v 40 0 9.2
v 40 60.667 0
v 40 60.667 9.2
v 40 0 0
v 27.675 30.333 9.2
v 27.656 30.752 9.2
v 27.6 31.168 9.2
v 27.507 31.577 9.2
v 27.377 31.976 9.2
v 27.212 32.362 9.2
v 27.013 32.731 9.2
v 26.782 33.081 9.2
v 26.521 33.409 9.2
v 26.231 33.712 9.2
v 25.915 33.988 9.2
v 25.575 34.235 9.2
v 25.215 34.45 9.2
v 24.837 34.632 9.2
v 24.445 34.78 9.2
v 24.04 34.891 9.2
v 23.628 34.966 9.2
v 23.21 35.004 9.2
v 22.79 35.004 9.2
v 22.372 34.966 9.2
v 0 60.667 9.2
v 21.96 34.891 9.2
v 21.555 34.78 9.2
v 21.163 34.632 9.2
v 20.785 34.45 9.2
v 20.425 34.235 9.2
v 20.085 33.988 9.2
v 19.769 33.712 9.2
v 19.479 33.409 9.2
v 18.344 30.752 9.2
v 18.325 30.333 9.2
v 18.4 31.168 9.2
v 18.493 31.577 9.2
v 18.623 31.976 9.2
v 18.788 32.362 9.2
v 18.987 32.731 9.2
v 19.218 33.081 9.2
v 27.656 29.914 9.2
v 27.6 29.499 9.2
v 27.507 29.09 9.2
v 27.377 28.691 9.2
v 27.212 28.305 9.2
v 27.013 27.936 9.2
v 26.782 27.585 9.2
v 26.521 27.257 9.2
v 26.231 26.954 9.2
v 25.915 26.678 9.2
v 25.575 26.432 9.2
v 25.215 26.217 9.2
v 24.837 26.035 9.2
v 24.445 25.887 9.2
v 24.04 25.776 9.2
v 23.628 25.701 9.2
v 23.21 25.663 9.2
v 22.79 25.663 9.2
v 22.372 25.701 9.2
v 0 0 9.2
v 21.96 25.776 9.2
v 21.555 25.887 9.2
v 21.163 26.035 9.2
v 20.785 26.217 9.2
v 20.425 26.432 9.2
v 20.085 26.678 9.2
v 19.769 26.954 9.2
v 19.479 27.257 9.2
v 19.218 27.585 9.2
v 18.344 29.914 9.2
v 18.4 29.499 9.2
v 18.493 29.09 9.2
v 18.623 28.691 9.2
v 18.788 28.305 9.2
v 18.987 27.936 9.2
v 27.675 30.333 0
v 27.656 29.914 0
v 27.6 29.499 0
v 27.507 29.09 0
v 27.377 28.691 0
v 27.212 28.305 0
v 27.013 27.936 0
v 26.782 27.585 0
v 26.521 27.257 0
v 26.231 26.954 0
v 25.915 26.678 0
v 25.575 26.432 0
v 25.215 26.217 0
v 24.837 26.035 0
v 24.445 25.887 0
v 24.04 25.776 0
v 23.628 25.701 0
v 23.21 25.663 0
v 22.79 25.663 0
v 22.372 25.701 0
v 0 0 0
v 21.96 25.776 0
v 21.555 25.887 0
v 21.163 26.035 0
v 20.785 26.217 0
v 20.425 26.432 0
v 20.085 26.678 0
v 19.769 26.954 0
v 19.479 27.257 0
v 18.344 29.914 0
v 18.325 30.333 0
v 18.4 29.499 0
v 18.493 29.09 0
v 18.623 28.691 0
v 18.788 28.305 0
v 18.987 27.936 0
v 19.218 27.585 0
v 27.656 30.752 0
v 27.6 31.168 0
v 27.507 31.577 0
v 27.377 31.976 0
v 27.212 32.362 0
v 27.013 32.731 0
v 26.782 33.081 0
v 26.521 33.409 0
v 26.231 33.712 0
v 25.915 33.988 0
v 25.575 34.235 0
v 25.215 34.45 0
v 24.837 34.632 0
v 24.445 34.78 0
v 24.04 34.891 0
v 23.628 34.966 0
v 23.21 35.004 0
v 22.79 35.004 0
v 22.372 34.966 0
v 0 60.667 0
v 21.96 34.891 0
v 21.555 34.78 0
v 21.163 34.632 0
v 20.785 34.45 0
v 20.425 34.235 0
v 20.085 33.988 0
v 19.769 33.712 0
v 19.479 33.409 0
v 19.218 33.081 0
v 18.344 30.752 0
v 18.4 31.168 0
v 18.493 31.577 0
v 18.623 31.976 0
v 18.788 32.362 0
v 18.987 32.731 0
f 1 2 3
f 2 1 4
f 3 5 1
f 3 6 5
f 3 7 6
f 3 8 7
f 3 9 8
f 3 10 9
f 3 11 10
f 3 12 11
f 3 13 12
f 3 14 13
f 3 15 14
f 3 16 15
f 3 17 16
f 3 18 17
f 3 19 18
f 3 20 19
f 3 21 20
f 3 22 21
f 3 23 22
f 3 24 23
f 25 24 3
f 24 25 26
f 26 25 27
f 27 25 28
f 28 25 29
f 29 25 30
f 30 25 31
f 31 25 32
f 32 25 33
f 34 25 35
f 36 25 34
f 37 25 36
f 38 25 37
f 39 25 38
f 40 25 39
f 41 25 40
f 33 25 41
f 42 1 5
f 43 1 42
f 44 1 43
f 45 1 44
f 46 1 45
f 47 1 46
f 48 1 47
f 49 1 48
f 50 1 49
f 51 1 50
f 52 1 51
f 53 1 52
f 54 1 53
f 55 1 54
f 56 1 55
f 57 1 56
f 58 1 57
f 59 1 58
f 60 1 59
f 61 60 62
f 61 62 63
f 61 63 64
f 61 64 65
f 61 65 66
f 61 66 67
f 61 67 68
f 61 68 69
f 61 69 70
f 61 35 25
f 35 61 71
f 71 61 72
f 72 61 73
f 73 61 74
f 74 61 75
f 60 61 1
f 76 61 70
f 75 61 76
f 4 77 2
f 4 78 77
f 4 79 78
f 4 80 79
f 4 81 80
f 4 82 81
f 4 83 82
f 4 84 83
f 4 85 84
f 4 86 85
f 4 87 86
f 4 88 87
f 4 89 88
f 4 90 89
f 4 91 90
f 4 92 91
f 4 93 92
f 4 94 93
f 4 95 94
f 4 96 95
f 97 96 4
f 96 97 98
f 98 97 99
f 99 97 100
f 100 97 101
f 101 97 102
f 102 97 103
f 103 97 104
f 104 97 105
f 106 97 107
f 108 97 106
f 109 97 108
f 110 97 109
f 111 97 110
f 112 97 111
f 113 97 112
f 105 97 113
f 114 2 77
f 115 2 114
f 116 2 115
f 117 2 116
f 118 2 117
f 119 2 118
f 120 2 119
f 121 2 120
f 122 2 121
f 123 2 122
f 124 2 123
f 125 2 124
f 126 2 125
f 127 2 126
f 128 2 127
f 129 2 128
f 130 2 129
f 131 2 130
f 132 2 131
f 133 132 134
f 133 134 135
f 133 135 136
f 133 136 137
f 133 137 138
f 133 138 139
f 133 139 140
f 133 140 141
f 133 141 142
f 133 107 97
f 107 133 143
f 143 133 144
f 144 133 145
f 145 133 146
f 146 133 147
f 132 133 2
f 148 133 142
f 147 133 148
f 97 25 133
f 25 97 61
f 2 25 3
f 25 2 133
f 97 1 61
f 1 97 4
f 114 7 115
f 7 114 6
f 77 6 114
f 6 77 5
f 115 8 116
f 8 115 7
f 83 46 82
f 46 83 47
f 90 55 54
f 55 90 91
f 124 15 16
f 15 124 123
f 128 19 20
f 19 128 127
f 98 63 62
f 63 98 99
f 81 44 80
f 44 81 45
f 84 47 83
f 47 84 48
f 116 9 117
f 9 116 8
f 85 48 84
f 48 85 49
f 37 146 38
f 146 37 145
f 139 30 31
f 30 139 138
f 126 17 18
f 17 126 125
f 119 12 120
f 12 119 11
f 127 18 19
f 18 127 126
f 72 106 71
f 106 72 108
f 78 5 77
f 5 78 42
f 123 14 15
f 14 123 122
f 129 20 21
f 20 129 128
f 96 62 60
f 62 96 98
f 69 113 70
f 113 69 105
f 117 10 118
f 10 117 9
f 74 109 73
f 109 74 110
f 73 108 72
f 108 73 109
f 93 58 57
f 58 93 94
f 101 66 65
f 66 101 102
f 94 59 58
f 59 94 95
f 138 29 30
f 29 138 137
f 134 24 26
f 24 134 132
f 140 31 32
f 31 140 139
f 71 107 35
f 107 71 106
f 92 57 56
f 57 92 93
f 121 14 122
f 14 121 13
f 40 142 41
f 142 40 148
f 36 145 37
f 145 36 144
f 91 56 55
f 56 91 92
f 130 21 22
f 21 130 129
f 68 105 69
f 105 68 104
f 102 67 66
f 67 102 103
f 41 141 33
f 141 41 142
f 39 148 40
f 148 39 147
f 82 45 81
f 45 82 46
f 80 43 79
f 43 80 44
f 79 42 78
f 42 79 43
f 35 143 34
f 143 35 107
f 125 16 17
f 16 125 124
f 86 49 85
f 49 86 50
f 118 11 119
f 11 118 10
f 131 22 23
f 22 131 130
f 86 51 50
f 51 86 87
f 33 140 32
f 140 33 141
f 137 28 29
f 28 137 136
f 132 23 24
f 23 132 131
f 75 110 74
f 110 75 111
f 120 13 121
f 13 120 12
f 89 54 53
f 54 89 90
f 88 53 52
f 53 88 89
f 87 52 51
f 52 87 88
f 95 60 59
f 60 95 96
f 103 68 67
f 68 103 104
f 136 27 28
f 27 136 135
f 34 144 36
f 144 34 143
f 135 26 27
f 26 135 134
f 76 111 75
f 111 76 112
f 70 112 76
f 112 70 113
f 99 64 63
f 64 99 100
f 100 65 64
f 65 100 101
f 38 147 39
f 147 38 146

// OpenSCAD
//everything is in units of millimeters
resolution = 0.35;

//variables to keep in-sync with the other scad file
mainShellThickness = 5 * resolution;
mainDepth = 60;
mainWidth = 91;
mainHeight = 37 + mainShellThickness;
caseCornerRadius = 2.5;
cylinderFragments = 70;

//keep in-sync with the main case file
mountingHoleRadius = 4.5;
mountingPillarRadius = mountingHoleRadius + 1.5;
mountingHoleHeight = 8.7;
mountingPillarHeight = mountingHoleHeight + 0.5;

plateDepth = mainDepth / 1.5;
plateWidth = mainWidth / 1.5;
plateThickness = mountingPillarHeight;
plateHoleRadius = mountingHoleRadius + resolution / 2;
plateMountingHoleX = plateDepth - plateThickness - mountingHoleRadius - 3.3; //keep aligned with mountingHoleX variable

difference() {
    cube([plateDepth, plateWidth, plateThickness]);
    
    //bottom mounting hole
    translate([plateMountingHoleX, plateWidth/2, 0]) {
      cylinder(plateThickness, plateHoleRadius, plateHoleRadius, $fn=cylinderFragments);
    };
};
